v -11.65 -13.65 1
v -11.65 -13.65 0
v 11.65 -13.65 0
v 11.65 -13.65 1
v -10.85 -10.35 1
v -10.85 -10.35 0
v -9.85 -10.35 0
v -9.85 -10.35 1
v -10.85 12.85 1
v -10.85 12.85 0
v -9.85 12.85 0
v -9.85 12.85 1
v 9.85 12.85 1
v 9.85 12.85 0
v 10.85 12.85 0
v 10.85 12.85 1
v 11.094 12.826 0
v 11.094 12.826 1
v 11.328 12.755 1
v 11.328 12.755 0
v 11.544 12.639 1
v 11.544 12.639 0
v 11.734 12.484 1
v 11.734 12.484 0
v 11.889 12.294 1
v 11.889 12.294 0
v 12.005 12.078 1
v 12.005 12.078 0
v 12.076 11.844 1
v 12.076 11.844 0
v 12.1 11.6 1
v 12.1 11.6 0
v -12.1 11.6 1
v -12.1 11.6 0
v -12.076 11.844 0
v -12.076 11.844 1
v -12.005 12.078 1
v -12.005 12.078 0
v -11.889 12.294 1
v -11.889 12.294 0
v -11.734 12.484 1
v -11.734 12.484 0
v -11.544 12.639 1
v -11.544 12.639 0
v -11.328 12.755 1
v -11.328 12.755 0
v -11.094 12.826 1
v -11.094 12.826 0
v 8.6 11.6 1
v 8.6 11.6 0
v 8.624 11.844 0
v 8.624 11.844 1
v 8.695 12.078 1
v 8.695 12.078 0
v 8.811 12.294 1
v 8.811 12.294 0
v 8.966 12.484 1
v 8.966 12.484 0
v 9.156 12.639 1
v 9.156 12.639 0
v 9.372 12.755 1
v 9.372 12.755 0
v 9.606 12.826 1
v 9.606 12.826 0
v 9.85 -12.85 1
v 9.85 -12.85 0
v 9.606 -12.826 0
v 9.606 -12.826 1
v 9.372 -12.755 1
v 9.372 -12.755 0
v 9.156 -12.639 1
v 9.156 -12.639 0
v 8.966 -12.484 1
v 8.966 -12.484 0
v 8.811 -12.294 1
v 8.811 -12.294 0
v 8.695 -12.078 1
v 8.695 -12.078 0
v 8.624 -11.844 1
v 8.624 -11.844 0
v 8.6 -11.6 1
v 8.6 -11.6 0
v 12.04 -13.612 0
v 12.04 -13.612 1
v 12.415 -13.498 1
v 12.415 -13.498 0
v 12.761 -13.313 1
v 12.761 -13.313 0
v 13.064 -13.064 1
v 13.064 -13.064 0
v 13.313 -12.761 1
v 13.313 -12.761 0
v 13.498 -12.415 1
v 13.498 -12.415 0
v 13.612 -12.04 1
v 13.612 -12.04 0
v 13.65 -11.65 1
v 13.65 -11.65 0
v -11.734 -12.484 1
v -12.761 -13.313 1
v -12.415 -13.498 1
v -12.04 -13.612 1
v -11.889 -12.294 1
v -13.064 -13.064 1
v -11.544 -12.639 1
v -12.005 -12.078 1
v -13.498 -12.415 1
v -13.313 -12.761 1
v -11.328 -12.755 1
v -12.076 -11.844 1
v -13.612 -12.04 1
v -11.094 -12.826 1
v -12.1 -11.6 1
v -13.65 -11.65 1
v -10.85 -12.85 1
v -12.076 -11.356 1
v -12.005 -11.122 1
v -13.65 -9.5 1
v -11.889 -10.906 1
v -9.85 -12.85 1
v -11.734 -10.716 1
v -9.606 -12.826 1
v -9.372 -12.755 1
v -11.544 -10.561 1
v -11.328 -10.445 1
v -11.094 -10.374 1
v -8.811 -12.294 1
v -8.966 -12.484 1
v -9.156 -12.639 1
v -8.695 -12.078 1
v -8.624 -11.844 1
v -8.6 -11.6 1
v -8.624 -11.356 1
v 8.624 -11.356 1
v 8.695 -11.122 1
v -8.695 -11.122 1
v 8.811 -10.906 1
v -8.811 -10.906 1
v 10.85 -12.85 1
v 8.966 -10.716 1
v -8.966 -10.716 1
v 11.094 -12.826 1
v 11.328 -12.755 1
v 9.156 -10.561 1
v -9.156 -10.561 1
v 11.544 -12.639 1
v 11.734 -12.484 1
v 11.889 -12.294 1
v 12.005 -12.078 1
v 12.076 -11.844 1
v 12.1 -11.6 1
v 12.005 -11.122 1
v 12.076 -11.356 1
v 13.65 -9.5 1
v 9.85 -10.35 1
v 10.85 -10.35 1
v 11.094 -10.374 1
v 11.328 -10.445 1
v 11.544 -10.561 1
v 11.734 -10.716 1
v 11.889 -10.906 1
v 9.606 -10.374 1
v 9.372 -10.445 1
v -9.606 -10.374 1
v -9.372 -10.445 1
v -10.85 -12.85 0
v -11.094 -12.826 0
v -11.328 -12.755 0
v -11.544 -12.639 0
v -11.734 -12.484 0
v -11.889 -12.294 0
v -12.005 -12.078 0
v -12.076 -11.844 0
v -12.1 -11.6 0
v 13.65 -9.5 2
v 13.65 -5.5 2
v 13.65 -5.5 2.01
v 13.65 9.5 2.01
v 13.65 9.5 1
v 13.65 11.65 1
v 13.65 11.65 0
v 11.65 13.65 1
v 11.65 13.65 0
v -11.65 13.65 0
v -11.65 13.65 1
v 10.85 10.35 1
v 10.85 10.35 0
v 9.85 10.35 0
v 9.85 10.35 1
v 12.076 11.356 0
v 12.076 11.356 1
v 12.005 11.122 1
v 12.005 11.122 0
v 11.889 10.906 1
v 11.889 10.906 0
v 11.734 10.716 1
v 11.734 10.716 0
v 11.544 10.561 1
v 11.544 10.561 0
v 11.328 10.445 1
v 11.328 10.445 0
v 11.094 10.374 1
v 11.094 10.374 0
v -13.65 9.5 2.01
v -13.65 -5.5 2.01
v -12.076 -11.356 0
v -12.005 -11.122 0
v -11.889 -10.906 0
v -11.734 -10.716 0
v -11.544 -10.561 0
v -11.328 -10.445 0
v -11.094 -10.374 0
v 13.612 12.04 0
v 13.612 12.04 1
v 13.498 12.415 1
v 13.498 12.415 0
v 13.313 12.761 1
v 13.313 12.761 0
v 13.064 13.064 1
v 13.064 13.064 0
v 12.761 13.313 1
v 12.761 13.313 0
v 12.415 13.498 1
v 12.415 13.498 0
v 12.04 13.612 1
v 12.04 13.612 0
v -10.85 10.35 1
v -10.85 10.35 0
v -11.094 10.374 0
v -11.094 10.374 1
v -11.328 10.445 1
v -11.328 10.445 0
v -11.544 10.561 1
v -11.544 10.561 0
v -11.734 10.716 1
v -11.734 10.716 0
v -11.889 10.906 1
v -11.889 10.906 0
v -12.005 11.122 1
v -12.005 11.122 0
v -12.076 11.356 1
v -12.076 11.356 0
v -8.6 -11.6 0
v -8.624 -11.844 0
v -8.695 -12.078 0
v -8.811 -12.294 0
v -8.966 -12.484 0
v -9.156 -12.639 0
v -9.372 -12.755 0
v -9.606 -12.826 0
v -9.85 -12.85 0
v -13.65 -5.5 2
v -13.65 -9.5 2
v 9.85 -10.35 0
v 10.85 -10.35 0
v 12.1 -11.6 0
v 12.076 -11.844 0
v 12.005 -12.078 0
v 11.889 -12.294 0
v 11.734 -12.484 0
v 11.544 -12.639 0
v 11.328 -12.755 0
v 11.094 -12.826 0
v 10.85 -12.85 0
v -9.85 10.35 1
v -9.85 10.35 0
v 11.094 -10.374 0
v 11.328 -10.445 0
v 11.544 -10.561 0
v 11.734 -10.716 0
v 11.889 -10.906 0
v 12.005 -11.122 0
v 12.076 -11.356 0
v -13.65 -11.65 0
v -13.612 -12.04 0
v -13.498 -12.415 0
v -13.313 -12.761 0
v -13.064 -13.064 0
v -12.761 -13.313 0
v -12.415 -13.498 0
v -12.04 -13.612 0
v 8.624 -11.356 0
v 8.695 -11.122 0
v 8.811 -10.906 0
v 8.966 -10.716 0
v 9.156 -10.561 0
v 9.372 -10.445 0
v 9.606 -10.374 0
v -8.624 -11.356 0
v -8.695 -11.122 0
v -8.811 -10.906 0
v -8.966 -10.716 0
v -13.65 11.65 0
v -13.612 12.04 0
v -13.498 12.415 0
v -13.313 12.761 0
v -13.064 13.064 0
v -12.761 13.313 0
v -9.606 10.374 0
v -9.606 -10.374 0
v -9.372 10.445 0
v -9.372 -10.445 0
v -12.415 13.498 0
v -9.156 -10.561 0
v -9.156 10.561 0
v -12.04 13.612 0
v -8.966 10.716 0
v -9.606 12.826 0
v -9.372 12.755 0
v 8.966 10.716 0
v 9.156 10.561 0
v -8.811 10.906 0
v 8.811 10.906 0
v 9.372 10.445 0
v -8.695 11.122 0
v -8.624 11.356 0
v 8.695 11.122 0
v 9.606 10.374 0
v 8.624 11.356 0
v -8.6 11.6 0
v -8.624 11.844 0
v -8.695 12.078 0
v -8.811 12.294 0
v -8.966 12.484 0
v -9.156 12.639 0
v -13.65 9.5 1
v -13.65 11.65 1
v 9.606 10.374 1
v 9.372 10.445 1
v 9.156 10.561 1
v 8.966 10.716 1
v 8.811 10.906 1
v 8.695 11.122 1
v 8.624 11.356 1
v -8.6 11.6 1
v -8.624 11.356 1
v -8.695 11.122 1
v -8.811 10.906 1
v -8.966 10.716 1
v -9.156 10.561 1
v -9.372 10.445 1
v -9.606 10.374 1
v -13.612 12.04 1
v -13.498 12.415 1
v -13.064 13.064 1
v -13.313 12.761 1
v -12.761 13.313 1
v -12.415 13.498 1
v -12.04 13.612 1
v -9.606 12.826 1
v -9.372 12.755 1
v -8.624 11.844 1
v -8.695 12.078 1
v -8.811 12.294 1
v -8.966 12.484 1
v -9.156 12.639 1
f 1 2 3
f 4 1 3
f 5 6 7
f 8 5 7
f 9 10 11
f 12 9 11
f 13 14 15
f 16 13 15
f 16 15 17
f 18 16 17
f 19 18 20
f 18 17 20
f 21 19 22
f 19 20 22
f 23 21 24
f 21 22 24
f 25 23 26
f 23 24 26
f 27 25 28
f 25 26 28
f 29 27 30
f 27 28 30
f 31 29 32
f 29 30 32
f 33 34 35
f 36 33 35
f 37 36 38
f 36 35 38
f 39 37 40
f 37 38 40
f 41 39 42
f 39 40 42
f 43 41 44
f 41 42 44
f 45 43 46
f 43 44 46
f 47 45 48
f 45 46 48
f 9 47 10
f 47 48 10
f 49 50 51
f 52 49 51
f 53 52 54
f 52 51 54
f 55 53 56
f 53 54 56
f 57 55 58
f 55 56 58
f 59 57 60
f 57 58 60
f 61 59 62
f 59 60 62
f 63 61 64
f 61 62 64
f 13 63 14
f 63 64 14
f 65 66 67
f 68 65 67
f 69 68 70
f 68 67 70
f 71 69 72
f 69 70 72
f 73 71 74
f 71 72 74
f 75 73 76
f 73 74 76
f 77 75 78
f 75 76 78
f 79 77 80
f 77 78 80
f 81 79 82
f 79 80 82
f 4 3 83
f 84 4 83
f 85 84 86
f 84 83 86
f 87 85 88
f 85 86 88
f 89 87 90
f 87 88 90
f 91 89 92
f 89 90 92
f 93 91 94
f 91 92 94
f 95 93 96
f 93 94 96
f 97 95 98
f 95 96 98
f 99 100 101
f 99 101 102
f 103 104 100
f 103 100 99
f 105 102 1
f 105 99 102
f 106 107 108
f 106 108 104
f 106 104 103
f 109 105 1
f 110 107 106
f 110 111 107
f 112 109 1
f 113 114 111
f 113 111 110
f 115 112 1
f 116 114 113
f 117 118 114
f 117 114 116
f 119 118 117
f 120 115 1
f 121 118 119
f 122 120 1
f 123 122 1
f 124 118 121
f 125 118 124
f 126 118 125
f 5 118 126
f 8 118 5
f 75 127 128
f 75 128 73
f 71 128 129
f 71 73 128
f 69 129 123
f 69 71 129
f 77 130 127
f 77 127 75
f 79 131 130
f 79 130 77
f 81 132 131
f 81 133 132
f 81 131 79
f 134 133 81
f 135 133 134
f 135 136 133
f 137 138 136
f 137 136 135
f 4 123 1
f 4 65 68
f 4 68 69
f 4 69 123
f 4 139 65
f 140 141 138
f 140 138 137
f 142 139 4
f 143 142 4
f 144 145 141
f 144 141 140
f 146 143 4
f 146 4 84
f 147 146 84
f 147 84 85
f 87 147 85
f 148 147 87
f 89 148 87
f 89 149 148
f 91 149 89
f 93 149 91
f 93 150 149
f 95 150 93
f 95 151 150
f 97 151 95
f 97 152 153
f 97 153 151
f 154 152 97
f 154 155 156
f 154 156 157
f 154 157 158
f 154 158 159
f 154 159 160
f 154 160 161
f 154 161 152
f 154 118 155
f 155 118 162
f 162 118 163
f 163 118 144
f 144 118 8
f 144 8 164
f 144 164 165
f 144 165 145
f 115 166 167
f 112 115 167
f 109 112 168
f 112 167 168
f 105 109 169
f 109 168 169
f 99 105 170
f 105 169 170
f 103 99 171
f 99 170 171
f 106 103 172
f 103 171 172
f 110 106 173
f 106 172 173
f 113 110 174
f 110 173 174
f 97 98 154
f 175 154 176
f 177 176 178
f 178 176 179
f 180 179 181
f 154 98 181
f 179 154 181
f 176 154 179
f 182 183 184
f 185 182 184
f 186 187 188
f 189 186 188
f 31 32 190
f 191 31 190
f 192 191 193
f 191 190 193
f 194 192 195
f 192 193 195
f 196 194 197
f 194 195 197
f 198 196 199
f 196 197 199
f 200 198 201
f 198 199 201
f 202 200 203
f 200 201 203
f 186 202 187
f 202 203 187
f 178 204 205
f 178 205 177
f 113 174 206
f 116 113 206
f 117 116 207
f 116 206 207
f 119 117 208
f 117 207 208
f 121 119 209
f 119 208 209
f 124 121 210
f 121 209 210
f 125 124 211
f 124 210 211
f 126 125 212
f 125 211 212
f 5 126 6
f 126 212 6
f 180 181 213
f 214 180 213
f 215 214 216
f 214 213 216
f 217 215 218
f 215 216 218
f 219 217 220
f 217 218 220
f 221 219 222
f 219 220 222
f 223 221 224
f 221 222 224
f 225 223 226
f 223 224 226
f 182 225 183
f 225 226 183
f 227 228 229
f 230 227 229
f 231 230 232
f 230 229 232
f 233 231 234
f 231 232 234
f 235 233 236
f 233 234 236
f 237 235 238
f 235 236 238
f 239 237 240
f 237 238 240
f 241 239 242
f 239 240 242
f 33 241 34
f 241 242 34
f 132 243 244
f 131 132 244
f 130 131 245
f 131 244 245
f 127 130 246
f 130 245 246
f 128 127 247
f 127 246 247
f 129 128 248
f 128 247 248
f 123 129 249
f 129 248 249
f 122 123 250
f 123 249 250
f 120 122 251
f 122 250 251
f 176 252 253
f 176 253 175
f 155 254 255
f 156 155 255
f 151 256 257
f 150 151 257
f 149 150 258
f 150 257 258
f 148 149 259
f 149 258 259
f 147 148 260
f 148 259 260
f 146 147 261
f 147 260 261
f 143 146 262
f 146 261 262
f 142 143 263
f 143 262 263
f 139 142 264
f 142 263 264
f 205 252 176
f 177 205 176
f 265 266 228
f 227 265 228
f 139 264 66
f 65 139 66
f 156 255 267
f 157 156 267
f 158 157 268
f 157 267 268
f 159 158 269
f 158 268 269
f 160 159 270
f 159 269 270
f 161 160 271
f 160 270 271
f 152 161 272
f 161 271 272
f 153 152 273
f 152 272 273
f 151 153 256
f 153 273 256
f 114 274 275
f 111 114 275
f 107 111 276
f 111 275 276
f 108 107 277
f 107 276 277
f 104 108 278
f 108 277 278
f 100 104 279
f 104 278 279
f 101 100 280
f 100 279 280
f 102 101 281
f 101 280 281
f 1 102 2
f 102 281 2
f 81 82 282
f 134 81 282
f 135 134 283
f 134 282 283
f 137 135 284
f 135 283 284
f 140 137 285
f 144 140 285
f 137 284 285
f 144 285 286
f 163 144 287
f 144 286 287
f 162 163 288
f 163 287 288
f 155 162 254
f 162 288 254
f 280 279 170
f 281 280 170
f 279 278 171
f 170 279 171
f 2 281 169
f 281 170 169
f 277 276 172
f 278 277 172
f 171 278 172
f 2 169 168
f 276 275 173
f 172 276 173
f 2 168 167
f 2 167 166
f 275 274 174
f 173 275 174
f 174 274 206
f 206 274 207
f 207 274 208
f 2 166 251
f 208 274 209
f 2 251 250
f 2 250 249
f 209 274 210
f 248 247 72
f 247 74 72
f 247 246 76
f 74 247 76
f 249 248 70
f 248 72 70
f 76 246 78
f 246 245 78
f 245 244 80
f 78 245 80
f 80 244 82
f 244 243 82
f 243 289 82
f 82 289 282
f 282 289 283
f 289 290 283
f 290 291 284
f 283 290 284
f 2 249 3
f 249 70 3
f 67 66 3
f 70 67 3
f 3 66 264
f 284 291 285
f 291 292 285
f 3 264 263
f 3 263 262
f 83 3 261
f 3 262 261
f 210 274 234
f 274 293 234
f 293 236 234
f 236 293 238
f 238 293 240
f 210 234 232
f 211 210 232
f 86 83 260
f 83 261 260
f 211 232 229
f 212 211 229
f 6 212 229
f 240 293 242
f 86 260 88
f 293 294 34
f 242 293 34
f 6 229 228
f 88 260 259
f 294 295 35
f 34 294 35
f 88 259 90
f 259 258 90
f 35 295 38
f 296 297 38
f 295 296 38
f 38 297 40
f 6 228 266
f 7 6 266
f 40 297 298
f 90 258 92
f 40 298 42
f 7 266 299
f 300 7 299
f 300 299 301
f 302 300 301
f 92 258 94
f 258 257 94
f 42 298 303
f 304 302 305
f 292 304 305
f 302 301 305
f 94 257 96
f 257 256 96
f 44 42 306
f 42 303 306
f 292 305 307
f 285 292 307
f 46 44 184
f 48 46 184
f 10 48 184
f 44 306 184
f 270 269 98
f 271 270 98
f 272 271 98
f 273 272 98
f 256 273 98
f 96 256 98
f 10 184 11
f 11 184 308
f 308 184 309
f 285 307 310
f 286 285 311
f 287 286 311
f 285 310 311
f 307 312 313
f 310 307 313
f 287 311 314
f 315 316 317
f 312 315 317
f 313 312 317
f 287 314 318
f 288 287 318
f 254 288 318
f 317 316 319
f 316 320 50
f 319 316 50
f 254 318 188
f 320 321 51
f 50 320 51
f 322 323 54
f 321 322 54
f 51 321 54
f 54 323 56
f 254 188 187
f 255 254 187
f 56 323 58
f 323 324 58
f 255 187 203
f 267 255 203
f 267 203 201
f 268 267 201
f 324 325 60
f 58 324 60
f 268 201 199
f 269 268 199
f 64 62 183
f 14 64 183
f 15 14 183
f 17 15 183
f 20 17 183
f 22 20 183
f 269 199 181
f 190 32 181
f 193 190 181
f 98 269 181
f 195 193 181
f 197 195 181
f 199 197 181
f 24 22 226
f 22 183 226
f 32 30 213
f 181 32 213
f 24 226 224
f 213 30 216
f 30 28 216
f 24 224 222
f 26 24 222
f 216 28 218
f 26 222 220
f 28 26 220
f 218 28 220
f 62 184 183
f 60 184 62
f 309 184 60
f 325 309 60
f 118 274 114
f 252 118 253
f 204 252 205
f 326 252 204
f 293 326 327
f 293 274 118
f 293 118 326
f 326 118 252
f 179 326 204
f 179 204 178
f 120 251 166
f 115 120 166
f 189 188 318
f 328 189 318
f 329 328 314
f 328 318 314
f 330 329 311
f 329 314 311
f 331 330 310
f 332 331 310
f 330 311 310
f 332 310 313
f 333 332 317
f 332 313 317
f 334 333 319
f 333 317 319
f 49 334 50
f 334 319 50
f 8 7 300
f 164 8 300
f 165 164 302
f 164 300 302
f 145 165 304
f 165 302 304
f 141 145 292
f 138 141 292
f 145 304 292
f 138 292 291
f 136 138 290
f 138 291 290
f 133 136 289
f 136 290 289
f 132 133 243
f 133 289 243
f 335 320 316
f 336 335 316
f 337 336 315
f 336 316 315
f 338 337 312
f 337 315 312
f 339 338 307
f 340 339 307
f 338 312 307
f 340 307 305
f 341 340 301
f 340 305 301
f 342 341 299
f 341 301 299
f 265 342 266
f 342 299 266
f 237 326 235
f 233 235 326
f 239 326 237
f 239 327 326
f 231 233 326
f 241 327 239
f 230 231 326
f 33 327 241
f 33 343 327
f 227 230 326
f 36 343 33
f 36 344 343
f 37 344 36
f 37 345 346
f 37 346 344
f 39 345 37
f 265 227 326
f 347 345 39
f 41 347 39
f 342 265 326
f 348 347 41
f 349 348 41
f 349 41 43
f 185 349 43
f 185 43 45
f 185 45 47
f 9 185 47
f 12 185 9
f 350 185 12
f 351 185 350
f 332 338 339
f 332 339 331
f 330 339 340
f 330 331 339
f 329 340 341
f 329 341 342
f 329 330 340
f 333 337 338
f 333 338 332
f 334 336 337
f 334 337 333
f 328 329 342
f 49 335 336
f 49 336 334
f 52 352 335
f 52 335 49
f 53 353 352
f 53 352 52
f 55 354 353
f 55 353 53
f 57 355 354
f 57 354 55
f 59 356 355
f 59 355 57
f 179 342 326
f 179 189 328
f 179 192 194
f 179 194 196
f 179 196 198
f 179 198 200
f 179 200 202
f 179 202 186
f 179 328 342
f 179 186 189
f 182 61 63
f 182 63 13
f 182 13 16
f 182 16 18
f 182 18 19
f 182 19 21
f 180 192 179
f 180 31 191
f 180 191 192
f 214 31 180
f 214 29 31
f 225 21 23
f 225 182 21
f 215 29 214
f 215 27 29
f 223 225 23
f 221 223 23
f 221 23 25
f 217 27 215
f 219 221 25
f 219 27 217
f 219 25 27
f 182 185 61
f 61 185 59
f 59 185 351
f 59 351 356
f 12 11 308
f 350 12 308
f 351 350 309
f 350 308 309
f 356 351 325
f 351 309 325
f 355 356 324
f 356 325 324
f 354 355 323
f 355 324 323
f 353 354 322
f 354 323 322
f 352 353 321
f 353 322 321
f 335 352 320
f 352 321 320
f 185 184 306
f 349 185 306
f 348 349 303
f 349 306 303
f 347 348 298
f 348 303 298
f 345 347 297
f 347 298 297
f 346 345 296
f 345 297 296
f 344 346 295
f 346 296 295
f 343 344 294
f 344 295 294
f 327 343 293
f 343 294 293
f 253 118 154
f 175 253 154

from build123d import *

# Parameters (mm, degrees)
F1_DEPTH = 1
F2_W     = 27.3
F2_H     = 19
F3_DEPTH = 1
F4_W     = 27.3
F4_H     = 15
F5_DEPTH = 0.01


with BuildPart() as f1:
    # F0 (on Top) → F1 (new body)
    with BuildSketch(Plane.XY):
        with BuildLine():
            Line((-11.65, -13.65), (11.65, -13.65))
            ThreePointArc((11.65, -13.65), (13.064214, -13.064214), (13.65, -11.65))
            Line((13.65, -11.65), (13.65, 11.65))
            ThreePointArc((13.65, 11.65), (13.064214, 13.064214), (11.65, 13.65))
            Line((11.65, 13.65), (-11.65, 13.65))
            ThreePointArc((-11.65, 13.65), (-13.064214, 13.064214), (-13.65, 11.65))
            Line((-13.65, 11.65), (-13.65, -11.65))
            ThreePointArc((-13.65, -11.65), (-13.064214, -13.064214), (-11.65, -13.65))
        make_face()
        with BuildLine():
            Line((-9.85, -12.85), (-10.85, -12.85))
            ThreePointArc((-10.85, -12.85), (-11.733883, -12.483883), (-12.1, -11.6))
            ThreePointArc((-12.1, -11.6), (-11.733883, -10.716117), (-10.85, -10.35))
            Line((-10.85, -10.35), (-9.85, -10.35))
            ThreePointArc((-9.85, -10.35), (-8.966117, -10.716117), (-8.6, -11.6))
            ThreePointArc((-8.6, -11.6), (-8.966117, -12.483883), (-9.85, -12.85))
        make_face(mode=Mode.SUBTRACT)
        with BuildLine():
            ThreePointArc((8.6, -11.6), (8.966117, -10.716117), (9.85, -10.35))
            Line((9.85, -10.35), (10.85, -10.35))
            ThreePointArc((10.85, -10.35), (11.733883, -10.716117), (12.1, -11.6))
            ThreePointArc((12.1, -11.6), (11.733883, -12.483883), (10.85, -12.85))
            Line((10.85, -12.85), (9.85, -12.85))
            ThreePointArc((9.85, -12.85), (8.966117, -12.483883), (8.6, -11.6))
        make_face(mode=Mode.SUBTRACT)
        with BuildLine():
            ThreePointArc((-8.6, 11.6), (-8.966117, 10.716117), (-9.85, 10.35))
            Line((-9.85, 10.35), (-10.85, 10.35))
            ThreePointArc((-10.85, 10.35), (-11.733883, 10.716117), (-12.1, 11.6))
            ThreePointArc((-12.1, 11.6), (-11.733883, 12.483883), (-10.85, 12.85))
            Line((-10.85, 12.85), (-9.85, 12.85))
            ThreePointArc((-9.85, 12.85), (-8.966117, 12.483883), (-8.6, 11.6))
        make_face(mode=Mode.SUBTRACT)
        with BuildLine():
            ThreePointArc((8.6, 11.6), (8.966117, 12.483883), (9.85, 12.85))
            Line((9.85, 12.85), (10.85, 12.85))
            ThreePointArc((10.85, 12.85), (11.733883, 12.483883), (12.1, 11.6))
            ThreePointArc((12.1, 11.6), (11.733883, 10.716117), (10.85, 10.35))
            Line((10.85, 10.35), (9.85, 10.35))
            ThreePointArc((9.85, 10.35), (8.966117, 10.716117), (8.6, 11.6))
        make_face(mode=Mode.SUBTRACT)
    extrude(amount=F1_DEPTH)

    # F2 (on face) → F3 (join)
    with BuildSketch(Plane.XY.offset(1)):
        Rectangle(F2_W, F2_H)
    extrude(amount=F3_DEPTH)

    # F4 (on face) → F5 (join)
    with BuildSketch(Plane.XY.offset(2)):
        with Locations((0, 2)):
            Rectangle(F4_W, F4_H)
    extrude(amount=F5_DEPTH)


solid = f1.part
